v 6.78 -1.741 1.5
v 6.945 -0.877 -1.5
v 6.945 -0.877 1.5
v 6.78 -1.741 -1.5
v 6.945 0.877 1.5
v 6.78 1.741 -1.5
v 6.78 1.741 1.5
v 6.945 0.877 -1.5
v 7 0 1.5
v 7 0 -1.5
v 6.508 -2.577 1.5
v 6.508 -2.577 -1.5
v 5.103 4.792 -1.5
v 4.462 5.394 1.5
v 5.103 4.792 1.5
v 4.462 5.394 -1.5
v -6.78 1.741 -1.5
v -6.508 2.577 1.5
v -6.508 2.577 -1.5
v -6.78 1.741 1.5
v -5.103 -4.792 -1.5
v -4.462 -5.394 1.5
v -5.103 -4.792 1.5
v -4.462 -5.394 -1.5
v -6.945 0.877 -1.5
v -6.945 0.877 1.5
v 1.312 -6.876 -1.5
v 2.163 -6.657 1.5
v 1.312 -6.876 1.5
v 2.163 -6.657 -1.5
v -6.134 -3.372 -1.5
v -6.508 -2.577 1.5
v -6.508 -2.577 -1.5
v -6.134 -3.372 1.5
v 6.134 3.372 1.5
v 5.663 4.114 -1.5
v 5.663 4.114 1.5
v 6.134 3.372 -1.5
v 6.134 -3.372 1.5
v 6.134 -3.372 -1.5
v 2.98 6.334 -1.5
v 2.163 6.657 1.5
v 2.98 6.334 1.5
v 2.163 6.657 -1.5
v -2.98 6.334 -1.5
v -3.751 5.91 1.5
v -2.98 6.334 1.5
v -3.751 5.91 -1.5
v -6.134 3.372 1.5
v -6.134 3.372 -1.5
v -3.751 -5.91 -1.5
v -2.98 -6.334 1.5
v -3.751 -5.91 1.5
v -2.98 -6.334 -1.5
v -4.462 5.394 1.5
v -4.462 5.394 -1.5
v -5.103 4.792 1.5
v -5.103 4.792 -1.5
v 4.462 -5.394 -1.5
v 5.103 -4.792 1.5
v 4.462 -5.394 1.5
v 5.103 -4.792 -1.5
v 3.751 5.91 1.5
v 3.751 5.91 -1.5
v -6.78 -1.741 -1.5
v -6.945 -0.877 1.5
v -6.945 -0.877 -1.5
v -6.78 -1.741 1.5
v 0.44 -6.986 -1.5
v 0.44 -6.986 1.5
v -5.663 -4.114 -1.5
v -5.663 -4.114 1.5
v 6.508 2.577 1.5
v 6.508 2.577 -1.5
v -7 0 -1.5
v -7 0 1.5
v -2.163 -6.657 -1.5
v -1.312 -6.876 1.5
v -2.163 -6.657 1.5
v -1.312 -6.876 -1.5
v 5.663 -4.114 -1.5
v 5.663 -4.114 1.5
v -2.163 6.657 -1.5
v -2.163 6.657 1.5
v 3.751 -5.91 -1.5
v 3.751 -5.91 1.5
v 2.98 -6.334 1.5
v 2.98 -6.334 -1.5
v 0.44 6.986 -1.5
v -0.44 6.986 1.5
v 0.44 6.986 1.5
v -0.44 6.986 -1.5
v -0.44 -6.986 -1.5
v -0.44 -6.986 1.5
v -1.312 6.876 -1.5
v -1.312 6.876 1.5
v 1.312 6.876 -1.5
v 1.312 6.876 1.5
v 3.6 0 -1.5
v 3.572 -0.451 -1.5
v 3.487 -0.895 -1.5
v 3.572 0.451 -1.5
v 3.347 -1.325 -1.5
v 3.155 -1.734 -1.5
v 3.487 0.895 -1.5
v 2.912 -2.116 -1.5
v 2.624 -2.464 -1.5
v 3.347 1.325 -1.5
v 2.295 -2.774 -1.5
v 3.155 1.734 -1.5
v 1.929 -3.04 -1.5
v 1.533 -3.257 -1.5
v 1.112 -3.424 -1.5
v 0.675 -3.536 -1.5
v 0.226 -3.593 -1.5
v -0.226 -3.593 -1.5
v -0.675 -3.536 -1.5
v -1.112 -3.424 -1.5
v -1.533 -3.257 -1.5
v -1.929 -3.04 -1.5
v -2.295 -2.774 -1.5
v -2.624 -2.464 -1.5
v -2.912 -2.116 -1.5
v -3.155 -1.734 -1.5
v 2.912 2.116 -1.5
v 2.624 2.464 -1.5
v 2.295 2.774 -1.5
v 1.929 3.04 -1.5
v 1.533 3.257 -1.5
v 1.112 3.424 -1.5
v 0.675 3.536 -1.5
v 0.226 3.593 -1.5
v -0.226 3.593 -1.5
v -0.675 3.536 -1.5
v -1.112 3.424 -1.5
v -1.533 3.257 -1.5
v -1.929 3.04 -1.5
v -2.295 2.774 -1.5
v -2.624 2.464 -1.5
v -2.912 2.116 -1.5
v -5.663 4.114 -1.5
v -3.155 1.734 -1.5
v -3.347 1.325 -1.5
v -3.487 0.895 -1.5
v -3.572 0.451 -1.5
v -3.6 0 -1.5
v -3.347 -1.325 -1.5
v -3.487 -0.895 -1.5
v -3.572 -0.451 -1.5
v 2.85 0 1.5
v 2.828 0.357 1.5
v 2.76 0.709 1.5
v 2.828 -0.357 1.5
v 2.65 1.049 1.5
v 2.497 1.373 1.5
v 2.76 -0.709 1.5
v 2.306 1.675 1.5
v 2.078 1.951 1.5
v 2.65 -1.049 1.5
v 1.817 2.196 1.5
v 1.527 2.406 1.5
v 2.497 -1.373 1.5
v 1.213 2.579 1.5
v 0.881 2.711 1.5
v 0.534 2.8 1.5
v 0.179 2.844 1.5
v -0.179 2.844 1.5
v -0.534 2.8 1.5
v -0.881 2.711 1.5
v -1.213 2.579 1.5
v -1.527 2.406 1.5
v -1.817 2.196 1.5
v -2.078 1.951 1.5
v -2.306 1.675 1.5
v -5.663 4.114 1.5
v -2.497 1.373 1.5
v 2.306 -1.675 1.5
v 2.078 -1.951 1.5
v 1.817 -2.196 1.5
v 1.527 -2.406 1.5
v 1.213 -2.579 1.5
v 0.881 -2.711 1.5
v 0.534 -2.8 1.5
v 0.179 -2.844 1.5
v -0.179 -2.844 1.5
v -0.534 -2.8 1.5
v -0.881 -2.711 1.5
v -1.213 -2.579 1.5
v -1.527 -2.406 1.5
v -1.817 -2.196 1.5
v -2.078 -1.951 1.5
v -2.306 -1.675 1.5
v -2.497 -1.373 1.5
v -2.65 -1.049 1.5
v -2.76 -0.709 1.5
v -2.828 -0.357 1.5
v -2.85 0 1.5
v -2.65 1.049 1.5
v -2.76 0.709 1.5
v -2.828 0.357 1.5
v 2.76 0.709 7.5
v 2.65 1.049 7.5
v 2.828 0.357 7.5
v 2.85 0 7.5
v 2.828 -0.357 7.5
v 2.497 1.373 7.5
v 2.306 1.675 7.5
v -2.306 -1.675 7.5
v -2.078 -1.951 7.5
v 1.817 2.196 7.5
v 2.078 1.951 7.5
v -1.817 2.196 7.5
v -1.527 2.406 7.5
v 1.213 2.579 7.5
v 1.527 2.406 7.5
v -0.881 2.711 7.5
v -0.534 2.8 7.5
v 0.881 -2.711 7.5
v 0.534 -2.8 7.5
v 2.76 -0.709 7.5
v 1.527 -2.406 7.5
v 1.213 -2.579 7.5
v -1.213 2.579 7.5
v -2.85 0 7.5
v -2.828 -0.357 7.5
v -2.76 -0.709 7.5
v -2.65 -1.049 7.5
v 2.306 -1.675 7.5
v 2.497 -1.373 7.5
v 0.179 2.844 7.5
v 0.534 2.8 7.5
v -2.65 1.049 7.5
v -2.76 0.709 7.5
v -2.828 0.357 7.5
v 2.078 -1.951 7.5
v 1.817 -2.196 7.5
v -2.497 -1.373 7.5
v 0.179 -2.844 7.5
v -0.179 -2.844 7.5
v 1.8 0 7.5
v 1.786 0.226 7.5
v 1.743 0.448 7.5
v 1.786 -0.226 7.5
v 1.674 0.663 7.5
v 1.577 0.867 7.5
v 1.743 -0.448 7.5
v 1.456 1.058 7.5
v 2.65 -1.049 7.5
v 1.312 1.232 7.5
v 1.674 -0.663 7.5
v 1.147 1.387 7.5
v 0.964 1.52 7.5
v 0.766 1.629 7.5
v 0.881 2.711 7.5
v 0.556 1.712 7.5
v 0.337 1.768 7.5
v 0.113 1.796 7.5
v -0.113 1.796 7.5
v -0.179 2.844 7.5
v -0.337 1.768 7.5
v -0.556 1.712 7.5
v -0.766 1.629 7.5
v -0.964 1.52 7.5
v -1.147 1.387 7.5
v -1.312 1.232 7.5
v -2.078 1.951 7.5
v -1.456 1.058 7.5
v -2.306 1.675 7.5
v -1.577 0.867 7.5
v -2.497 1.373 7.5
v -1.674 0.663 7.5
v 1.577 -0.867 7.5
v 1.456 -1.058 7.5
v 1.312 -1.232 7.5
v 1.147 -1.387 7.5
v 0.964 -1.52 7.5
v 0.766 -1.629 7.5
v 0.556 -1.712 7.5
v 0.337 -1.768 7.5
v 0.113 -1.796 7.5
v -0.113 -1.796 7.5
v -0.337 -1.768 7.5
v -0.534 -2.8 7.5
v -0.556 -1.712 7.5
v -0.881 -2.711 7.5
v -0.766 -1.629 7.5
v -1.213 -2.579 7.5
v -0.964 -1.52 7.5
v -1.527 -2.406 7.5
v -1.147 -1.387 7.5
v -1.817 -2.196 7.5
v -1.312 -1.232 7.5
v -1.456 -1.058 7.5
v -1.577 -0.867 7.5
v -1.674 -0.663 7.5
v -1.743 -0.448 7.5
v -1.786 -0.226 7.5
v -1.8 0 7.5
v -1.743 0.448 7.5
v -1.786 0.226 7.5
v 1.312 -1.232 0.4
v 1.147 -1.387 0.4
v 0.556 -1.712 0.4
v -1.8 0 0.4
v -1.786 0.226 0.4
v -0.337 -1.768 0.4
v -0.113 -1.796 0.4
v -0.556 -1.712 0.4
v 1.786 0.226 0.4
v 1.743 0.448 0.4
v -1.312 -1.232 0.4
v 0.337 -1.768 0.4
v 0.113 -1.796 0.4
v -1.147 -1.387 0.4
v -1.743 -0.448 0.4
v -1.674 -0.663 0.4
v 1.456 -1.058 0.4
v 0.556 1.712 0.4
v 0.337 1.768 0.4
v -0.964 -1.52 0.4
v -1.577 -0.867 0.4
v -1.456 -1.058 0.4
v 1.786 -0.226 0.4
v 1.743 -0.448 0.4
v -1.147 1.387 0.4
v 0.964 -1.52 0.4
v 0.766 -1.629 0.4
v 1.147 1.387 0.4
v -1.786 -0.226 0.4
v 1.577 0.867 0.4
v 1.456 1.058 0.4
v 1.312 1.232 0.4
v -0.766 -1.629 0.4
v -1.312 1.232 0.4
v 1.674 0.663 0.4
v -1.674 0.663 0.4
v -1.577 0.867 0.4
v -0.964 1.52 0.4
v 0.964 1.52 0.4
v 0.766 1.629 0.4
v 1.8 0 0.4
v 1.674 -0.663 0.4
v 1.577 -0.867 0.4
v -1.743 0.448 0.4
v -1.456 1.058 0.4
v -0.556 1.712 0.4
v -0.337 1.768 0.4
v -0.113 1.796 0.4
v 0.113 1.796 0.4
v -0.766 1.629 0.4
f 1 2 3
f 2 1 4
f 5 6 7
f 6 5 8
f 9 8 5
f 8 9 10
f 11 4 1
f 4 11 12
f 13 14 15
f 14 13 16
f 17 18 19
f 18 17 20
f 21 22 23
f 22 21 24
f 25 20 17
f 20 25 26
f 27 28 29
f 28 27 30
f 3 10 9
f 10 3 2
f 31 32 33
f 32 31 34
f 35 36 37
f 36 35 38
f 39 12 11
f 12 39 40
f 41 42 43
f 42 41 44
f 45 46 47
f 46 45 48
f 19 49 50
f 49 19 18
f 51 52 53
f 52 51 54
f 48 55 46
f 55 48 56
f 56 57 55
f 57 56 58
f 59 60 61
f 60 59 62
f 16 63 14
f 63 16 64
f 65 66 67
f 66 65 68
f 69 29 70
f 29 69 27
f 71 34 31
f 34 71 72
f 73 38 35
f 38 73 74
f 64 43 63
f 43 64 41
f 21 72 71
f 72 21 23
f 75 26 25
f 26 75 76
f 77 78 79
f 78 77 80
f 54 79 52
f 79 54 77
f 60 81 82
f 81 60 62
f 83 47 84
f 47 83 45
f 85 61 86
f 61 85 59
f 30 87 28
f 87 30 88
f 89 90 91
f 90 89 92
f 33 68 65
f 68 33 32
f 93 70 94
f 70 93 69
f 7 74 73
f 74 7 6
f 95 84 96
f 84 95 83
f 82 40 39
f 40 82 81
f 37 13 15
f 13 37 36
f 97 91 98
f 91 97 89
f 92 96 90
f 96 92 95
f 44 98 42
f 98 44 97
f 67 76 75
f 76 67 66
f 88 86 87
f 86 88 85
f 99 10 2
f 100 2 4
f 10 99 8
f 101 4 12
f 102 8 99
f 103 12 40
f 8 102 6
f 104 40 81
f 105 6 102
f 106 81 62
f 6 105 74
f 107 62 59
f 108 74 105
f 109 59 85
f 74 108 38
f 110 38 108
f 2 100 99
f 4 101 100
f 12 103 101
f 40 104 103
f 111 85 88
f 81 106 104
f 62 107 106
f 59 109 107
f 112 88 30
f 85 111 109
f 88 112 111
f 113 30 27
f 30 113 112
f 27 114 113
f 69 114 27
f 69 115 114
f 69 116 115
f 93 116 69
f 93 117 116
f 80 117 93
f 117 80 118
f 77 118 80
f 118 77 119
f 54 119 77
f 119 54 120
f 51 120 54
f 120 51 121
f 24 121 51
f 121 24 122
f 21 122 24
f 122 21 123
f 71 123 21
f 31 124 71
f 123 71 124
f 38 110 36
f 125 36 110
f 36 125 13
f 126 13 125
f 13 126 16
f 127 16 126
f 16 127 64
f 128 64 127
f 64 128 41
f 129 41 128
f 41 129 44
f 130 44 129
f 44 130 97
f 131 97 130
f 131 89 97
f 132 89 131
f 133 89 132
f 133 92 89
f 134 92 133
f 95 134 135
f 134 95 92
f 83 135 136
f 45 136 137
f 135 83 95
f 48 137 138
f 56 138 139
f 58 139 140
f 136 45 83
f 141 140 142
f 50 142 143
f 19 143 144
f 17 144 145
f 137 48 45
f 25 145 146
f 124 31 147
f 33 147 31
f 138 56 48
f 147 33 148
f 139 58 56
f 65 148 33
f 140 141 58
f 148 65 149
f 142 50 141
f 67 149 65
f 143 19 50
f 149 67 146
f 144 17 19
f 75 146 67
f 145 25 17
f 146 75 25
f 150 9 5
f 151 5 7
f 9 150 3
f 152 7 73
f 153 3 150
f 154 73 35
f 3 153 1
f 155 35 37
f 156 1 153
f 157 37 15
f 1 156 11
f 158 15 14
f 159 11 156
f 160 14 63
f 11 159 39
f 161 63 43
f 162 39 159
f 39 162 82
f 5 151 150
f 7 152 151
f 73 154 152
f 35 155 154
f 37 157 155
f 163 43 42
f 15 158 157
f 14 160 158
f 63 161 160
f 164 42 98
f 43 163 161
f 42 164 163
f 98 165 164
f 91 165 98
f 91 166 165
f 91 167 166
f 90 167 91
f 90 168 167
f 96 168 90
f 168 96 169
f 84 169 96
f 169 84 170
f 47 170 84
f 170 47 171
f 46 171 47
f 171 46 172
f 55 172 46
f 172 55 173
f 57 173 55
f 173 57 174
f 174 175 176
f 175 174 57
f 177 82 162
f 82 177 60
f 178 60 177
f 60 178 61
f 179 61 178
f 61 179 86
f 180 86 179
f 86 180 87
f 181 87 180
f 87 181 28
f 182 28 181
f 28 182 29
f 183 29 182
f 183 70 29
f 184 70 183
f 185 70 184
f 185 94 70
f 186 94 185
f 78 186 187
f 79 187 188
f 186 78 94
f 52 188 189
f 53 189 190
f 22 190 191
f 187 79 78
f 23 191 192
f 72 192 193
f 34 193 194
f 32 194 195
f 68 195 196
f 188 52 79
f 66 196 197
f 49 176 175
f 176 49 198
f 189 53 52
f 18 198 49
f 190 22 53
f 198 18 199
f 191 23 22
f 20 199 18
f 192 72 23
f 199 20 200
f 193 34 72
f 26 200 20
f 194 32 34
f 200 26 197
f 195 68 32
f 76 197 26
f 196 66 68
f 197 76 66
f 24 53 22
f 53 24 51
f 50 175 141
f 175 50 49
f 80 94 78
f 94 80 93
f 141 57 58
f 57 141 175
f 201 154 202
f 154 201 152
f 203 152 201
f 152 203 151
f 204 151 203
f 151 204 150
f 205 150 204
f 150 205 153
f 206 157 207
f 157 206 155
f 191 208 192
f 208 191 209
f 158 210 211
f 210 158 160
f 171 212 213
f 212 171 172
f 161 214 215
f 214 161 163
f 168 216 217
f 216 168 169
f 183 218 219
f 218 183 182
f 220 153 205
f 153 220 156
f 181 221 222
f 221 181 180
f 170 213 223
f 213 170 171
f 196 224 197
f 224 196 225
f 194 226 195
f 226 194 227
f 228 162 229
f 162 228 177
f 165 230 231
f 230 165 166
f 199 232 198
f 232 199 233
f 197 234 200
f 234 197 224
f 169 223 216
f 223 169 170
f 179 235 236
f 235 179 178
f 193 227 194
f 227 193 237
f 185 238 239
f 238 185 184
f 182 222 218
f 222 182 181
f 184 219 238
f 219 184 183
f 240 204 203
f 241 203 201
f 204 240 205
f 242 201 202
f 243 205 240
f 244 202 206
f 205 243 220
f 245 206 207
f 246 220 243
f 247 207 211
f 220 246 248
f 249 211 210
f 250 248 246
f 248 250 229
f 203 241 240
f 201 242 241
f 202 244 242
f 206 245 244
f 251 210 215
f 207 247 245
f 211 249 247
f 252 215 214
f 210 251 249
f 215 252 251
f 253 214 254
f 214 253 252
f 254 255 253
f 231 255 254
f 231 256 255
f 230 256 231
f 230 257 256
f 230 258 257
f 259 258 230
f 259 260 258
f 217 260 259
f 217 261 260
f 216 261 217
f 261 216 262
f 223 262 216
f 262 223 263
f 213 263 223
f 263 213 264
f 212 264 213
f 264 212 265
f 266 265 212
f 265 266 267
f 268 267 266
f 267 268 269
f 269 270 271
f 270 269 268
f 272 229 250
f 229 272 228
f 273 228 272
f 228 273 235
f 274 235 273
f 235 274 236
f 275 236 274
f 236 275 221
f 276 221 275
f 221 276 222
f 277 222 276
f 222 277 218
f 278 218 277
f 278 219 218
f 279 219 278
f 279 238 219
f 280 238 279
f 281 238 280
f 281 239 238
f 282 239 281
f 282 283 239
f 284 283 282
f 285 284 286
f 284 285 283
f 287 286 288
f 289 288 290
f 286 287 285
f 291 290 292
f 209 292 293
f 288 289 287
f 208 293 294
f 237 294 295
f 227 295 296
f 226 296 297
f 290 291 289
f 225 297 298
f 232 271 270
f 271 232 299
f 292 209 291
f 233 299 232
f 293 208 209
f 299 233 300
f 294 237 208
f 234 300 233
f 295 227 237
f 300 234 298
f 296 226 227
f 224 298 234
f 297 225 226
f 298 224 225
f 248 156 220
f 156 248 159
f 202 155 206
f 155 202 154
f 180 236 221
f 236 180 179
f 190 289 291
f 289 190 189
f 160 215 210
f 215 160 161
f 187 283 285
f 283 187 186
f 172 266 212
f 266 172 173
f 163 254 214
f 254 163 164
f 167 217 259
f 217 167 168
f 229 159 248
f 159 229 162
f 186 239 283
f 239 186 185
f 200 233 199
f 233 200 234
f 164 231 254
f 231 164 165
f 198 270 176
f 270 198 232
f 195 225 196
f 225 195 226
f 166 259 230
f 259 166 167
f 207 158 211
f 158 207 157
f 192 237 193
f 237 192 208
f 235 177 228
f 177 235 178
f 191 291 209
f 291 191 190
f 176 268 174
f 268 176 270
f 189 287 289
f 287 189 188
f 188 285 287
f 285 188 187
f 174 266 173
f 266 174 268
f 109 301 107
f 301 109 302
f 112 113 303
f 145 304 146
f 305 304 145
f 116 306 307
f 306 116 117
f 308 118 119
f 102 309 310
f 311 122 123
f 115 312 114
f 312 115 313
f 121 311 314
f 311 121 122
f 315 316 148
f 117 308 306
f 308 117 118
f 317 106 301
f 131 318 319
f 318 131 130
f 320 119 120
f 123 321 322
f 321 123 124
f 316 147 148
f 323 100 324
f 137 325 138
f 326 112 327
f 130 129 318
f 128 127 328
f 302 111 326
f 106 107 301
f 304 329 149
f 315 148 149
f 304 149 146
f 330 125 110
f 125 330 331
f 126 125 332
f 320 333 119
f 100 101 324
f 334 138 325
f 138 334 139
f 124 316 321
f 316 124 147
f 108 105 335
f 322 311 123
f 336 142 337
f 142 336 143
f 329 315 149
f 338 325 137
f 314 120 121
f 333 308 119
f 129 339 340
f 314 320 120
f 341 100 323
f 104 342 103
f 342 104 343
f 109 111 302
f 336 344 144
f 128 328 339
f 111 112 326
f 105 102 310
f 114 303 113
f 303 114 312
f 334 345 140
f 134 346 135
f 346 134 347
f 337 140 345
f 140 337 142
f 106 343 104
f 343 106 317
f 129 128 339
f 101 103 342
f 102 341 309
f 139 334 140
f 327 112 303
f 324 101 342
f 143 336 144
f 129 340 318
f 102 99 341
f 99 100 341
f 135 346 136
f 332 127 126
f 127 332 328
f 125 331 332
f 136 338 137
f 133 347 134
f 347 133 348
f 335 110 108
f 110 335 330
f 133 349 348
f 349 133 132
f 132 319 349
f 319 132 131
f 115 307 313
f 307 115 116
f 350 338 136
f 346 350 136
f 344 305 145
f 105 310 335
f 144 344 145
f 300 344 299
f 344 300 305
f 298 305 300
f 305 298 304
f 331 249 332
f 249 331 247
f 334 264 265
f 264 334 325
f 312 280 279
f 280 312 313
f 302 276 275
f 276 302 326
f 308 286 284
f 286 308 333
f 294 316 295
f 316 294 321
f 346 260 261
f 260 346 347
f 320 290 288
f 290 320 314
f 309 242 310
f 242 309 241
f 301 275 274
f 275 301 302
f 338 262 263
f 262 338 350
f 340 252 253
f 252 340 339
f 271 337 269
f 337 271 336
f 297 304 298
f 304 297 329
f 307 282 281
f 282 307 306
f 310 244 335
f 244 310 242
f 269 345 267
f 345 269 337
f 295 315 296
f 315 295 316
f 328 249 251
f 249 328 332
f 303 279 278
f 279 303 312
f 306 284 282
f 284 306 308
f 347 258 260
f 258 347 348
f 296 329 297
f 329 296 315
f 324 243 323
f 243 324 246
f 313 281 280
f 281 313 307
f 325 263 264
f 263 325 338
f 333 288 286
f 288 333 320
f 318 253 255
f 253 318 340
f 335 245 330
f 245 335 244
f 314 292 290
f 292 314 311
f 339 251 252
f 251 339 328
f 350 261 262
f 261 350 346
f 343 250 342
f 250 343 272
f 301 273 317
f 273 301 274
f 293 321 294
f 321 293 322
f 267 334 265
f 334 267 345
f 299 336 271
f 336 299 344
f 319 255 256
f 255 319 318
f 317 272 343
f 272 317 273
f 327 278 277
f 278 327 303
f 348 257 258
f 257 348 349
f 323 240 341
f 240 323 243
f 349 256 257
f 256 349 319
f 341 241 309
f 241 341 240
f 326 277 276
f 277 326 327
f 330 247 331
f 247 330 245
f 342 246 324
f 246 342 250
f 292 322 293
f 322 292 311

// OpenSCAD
$fn = 50;


difference() {
	union() {
		translate(v = [0, 0, -1.5000000000]) {
			cylinder(h = 3, r = 7.0000000000);
		}
		translate(v = [0, 0, -1.5000000000]) {
			cylinder(h = 9, r = 2.8500000000);
		}
	}
	union() {
		translate(v = [0, 0, -1.5000000000]) {
			rotate(a = [0, 180, 0]) {
				difference() {
					union() {
						translate(v = [0, 0, -9.0000000000]) {
							cylinder(h = 9, r = 1.5000000000);
						}
						translate(v = [0, 0, -1.9000000000]) {
							cylinder(h = 1.9000000000, r1 = 1.8000000000, r2 = 3.6000000000);
						}
						translate(v = [0, 0, -9.0000000000]) {
							cylinder(h = 9, r = 1.8000000000);
						}
						translate(v = [0, 0, -9.0000000000]) {
							cylinder(h = 9, r = 1.5000000000);
						}
					}
					union();
				}
			}
		}
		translate(v = [0, 0, -50.0000000000]) {
			cylinder(h = 100, r = 1.8000000000);
		}
	}
}
